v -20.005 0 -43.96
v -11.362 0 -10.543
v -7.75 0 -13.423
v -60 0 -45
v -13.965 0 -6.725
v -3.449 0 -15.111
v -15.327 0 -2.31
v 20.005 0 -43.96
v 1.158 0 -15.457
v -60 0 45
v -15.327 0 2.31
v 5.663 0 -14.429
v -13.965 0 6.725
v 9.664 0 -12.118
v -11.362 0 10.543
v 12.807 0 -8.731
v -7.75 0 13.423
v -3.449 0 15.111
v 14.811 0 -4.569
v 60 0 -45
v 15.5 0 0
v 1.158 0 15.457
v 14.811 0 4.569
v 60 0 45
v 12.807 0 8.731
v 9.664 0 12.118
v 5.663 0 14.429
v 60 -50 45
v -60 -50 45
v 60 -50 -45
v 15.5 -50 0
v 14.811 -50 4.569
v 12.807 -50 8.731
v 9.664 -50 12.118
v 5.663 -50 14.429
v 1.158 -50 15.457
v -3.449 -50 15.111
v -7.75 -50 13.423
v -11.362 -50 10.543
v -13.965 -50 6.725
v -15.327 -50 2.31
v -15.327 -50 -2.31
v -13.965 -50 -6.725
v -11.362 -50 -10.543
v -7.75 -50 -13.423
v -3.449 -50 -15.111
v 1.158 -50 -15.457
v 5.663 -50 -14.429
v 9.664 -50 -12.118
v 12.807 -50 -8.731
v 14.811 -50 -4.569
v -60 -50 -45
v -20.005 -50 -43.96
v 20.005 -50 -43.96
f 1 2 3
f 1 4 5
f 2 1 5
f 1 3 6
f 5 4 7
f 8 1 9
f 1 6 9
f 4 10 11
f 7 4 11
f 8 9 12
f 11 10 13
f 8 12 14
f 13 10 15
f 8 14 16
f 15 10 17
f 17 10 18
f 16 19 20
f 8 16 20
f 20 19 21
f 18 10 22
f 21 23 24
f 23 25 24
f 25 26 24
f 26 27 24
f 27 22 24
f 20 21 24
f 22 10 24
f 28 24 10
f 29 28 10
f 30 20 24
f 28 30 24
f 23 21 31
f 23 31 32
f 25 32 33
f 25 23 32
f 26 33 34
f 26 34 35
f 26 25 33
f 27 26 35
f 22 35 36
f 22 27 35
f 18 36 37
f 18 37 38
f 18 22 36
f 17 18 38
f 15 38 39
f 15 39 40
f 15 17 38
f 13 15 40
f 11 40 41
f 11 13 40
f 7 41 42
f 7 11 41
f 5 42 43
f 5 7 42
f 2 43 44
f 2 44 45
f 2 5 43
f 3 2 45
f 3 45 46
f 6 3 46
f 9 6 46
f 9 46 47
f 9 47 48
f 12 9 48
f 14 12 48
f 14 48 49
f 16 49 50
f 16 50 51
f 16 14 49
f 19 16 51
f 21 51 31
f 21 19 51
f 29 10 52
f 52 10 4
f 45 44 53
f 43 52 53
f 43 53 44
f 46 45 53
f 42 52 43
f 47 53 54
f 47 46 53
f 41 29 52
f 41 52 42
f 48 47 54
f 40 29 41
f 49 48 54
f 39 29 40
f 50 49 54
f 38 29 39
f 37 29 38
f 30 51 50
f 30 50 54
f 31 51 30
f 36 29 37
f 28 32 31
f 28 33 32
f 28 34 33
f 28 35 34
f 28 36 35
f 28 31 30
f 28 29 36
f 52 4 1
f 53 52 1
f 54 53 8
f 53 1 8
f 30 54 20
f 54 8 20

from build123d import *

# Parameters (mm, degrees)
F0_R     = 15.5
F1_DEPTH = 50


with BuildPart() as f1:
    # F0 (on Front) → F1 (new body)
    with BuildSketch(Plane.XZ):
        with BuildLine():
            Line((60, 45), (-60, 45))
            Line((-60, 45), (-60, -45))
            ThreePointArc((-60, -45), (0, -43.829965), (60, -45))
            Line((60, -45), (60, 45))
        make_face()
        Circle(F0_R, mode=Mode.SUBTRACT)
    extrude(amount=F1_DEPTH)


solid = f1.part
